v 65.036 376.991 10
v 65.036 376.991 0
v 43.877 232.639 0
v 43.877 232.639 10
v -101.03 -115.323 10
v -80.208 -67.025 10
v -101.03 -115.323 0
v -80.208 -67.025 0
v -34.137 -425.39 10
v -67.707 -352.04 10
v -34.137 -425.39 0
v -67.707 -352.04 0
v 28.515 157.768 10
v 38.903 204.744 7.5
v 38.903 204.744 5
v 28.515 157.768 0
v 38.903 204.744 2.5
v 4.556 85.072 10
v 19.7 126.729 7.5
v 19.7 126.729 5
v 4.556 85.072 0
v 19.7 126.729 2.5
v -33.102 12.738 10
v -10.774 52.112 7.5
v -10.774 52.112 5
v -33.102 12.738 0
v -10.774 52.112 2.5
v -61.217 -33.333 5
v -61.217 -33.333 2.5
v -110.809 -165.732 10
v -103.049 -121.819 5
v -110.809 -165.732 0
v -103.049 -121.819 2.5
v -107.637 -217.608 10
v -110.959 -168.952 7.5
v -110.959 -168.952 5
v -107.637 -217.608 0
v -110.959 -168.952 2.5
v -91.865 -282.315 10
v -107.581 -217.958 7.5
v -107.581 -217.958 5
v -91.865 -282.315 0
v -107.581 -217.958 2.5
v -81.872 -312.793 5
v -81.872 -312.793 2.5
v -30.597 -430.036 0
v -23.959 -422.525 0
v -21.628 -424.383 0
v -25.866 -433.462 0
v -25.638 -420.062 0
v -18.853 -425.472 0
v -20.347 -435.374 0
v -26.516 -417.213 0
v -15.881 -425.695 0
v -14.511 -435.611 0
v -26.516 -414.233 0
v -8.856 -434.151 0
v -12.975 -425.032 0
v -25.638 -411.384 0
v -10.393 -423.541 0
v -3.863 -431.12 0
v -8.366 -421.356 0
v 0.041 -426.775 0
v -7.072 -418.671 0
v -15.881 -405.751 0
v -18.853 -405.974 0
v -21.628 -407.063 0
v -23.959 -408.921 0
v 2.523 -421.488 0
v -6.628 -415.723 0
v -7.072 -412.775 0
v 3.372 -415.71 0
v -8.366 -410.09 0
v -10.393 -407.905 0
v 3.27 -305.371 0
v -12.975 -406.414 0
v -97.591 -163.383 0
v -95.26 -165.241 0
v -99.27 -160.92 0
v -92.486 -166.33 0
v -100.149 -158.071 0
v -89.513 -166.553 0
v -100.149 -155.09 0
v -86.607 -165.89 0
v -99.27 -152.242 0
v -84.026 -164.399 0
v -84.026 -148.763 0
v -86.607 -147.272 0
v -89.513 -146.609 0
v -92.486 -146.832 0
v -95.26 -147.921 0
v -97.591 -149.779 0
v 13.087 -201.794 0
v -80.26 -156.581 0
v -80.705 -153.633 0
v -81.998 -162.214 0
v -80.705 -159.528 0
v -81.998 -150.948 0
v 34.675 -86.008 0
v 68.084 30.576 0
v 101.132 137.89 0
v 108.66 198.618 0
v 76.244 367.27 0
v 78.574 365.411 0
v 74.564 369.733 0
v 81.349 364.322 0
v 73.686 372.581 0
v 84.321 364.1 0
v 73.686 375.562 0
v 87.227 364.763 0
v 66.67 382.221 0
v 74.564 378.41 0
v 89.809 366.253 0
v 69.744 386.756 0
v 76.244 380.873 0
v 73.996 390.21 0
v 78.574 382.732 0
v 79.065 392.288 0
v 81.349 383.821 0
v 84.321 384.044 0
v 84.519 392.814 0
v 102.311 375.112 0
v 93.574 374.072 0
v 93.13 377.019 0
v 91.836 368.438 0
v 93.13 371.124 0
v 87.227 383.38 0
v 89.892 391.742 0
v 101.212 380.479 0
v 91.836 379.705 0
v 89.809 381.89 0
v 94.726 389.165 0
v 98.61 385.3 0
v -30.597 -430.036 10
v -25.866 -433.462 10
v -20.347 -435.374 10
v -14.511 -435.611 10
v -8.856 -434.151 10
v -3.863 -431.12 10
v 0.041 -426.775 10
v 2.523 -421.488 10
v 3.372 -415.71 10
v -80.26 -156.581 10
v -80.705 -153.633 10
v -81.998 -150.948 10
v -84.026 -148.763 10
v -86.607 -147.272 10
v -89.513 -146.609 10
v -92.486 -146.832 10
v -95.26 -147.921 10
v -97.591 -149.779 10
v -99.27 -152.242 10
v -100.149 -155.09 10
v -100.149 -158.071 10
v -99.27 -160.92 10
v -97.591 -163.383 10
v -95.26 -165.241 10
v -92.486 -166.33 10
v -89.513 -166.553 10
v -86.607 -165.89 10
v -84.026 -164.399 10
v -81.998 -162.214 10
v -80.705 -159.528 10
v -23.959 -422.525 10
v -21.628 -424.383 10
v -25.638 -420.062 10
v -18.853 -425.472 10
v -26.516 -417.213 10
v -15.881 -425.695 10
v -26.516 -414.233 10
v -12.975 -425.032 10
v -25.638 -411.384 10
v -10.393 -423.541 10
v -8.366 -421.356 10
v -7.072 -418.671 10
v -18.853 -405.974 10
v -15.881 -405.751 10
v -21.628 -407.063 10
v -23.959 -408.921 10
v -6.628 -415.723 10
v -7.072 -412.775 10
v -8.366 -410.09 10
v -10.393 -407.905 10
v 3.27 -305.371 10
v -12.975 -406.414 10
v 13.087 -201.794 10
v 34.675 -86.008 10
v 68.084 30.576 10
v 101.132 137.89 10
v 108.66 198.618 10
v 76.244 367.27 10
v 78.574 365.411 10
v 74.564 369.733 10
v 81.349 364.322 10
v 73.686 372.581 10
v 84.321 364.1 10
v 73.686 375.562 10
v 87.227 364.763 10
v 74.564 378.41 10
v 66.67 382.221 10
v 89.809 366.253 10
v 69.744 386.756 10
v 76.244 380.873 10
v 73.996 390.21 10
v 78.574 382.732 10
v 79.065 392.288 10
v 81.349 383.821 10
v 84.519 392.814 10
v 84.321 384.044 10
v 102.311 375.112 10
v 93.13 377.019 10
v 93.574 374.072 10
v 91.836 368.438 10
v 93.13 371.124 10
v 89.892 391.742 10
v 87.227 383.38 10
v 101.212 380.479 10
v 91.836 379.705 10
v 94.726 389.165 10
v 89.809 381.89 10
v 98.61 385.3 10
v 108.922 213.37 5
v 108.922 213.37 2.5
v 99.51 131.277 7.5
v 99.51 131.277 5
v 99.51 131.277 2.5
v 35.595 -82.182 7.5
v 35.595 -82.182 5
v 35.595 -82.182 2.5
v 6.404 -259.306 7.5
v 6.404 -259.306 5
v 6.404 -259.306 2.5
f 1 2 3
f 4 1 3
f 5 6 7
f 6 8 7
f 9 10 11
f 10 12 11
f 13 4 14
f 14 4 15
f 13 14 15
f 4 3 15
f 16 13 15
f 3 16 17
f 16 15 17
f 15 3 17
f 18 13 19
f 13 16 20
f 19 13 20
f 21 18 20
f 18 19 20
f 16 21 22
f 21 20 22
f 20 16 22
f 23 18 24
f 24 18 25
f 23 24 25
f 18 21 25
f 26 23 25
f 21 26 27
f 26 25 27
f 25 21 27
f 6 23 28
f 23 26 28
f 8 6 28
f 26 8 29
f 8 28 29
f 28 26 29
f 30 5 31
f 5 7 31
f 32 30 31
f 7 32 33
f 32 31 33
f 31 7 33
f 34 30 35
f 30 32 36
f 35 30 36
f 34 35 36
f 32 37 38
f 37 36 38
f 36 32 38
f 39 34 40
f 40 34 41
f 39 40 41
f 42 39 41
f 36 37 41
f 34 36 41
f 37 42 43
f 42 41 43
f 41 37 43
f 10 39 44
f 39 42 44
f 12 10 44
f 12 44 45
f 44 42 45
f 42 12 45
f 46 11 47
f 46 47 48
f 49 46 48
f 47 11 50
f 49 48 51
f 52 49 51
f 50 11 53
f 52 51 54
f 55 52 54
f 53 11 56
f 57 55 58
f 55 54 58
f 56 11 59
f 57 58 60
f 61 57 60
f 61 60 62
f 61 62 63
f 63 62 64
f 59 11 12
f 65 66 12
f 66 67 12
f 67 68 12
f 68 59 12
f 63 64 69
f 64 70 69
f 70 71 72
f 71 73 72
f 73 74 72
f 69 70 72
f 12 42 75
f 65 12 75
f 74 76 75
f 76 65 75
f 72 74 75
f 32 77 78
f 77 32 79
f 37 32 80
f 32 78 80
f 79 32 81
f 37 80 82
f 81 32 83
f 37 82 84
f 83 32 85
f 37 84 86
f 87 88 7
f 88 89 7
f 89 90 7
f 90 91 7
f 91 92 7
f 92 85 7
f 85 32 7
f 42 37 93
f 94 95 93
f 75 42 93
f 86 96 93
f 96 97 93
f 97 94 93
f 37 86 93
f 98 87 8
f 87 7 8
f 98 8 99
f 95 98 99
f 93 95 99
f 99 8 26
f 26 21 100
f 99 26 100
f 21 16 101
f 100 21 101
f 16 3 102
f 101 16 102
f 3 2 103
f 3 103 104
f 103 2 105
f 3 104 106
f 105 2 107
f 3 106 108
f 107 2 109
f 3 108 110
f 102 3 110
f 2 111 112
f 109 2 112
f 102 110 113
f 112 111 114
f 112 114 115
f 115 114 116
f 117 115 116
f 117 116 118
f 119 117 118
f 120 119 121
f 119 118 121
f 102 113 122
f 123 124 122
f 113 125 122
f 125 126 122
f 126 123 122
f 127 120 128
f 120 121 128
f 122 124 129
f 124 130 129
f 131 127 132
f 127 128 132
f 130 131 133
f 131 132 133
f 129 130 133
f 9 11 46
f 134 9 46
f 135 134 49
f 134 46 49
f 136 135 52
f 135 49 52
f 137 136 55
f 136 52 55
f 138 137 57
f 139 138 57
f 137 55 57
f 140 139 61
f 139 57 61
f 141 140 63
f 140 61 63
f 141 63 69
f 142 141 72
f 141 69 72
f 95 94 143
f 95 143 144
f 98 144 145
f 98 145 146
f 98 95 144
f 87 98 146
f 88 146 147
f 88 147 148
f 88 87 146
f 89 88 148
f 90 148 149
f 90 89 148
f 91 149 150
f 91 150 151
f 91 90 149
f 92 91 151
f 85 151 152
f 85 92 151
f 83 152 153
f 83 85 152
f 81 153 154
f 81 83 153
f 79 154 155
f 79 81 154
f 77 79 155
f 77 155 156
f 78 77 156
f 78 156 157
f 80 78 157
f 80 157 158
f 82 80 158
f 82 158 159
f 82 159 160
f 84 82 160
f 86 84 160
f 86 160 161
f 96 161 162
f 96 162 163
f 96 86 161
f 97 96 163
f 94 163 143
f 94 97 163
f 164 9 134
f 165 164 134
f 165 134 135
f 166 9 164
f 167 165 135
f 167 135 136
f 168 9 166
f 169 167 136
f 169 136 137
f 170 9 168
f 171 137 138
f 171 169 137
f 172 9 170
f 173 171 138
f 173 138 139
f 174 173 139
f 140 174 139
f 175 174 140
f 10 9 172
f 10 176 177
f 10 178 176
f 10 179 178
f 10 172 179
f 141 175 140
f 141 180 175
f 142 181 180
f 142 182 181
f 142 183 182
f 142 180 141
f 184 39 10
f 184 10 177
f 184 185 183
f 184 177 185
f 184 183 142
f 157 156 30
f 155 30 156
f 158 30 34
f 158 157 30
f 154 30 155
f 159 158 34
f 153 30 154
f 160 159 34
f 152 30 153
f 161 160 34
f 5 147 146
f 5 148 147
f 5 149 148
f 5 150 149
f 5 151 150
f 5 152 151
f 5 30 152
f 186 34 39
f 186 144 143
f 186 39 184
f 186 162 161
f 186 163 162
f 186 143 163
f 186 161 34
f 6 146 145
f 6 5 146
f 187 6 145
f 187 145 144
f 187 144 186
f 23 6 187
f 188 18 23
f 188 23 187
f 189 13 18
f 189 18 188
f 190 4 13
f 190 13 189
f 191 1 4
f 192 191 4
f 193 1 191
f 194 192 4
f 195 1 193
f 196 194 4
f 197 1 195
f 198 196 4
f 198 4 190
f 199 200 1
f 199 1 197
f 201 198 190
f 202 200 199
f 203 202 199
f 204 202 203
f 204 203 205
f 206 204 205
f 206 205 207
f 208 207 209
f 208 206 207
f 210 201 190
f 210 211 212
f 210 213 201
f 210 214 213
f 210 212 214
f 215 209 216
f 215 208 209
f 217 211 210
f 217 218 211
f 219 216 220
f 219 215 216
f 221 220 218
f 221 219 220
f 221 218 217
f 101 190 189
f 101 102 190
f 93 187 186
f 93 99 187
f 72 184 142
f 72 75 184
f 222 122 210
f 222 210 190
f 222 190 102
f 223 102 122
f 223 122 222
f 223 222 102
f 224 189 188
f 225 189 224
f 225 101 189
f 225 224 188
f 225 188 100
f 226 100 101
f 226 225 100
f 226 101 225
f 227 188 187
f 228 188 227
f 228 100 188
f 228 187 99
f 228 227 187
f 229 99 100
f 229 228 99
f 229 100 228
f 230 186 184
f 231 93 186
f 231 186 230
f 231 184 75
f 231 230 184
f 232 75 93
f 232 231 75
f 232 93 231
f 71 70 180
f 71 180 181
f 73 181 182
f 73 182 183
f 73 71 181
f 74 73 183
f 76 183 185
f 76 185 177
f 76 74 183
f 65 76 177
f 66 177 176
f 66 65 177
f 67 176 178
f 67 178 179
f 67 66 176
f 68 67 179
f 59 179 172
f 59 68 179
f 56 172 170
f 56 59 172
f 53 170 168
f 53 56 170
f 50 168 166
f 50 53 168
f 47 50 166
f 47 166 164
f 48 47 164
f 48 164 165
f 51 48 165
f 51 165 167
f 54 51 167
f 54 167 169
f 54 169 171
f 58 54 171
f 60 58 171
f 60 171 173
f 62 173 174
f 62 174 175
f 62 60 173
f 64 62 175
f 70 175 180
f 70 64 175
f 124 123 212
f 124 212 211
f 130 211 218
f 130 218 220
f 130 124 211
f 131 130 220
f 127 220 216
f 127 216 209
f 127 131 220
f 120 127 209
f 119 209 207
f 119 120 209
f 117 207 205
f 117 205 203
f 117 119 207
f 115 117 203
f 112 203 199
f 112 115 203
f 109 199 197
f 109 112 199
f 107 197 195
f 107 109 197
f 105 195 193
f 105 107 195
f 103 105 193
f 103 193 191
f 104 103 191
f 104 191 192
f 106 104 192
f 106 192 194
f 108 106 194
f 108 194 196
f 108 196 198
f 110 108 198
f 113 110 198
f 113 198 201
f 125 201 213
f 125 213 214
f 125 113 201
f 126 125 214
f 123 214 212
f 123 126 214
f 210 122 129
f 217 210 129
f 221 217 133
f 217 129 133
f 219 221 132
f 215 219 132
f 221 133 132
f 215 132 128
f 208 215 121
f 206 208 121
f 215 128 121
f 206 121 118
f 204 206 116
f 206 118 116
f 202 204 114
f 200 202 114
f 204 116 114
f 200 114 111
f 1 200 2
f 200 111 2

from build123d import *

# Parameters (mm, degrees)
SKETCH_1_R      = 10
EXTRUDE_1_DEPTH = 10


with BuildPart() as part:
    # 草图1 → 凸台-拉伸1 (new body)
    with BuildSketch(Plane.XY):
        with BuildLine():
            ThreePointArc((102.311199765, 375.112029052), (84.51881015, 392.813872233), (65.036461943, 376.991025191))
            add(Edge.make_bspline(
                [(65.036461943, 376.991025191), (45.889114215, 252.94224697), (35.523806995, 78.694440088), (-140.807905589, -126.022717356), (-84.82622195, -308.616556427), (-57.331193012, -381.18062786), (-34.136574311, -425.390150911)],
                knots=[0, 0, 0, 0, 0.3944471, 0.667710935, 0.855398119, 1, 1, 1, 1], degree=3))
            ThreePointArc((-34.136574311, -425.390150911), (-11.630086846, -435.088456797), (3.37189665, -415.709612502))
            add(Edge.make_bspline(
                [(102.311199765, 375.112029052), (112.225704632, 196.555058064), (112.566880399, 154.384362349), (23.686233986, -90.793091468), (0.034750928, -297.28578118), (3.331067876, -354.836460231), (3.37189665, -415.709612502)],
                knots=[0, 0, 0, 0, 0.332735052, 0.581141854, 0.871633558, 1, 1, 1, 1], degree=3))
        make_face()
        with Locations((83.57402568, 374.071633918)):
            Circle(SKETCH_1_R, mode=Mode.SUBTRACT)
        with Locations((-90.260469952, -156.580915428)):
            Circle(SKETCH_1_R, mode=Mode.SUBTRACT)
        with Locations((-16.628098851, -415.723026877)):
            Circle(SKETCH_1_R, mode=Mode.SUBTRACT)
    extrude(amount=EXTRUDE_1_DEPTH)


solid = part.part
